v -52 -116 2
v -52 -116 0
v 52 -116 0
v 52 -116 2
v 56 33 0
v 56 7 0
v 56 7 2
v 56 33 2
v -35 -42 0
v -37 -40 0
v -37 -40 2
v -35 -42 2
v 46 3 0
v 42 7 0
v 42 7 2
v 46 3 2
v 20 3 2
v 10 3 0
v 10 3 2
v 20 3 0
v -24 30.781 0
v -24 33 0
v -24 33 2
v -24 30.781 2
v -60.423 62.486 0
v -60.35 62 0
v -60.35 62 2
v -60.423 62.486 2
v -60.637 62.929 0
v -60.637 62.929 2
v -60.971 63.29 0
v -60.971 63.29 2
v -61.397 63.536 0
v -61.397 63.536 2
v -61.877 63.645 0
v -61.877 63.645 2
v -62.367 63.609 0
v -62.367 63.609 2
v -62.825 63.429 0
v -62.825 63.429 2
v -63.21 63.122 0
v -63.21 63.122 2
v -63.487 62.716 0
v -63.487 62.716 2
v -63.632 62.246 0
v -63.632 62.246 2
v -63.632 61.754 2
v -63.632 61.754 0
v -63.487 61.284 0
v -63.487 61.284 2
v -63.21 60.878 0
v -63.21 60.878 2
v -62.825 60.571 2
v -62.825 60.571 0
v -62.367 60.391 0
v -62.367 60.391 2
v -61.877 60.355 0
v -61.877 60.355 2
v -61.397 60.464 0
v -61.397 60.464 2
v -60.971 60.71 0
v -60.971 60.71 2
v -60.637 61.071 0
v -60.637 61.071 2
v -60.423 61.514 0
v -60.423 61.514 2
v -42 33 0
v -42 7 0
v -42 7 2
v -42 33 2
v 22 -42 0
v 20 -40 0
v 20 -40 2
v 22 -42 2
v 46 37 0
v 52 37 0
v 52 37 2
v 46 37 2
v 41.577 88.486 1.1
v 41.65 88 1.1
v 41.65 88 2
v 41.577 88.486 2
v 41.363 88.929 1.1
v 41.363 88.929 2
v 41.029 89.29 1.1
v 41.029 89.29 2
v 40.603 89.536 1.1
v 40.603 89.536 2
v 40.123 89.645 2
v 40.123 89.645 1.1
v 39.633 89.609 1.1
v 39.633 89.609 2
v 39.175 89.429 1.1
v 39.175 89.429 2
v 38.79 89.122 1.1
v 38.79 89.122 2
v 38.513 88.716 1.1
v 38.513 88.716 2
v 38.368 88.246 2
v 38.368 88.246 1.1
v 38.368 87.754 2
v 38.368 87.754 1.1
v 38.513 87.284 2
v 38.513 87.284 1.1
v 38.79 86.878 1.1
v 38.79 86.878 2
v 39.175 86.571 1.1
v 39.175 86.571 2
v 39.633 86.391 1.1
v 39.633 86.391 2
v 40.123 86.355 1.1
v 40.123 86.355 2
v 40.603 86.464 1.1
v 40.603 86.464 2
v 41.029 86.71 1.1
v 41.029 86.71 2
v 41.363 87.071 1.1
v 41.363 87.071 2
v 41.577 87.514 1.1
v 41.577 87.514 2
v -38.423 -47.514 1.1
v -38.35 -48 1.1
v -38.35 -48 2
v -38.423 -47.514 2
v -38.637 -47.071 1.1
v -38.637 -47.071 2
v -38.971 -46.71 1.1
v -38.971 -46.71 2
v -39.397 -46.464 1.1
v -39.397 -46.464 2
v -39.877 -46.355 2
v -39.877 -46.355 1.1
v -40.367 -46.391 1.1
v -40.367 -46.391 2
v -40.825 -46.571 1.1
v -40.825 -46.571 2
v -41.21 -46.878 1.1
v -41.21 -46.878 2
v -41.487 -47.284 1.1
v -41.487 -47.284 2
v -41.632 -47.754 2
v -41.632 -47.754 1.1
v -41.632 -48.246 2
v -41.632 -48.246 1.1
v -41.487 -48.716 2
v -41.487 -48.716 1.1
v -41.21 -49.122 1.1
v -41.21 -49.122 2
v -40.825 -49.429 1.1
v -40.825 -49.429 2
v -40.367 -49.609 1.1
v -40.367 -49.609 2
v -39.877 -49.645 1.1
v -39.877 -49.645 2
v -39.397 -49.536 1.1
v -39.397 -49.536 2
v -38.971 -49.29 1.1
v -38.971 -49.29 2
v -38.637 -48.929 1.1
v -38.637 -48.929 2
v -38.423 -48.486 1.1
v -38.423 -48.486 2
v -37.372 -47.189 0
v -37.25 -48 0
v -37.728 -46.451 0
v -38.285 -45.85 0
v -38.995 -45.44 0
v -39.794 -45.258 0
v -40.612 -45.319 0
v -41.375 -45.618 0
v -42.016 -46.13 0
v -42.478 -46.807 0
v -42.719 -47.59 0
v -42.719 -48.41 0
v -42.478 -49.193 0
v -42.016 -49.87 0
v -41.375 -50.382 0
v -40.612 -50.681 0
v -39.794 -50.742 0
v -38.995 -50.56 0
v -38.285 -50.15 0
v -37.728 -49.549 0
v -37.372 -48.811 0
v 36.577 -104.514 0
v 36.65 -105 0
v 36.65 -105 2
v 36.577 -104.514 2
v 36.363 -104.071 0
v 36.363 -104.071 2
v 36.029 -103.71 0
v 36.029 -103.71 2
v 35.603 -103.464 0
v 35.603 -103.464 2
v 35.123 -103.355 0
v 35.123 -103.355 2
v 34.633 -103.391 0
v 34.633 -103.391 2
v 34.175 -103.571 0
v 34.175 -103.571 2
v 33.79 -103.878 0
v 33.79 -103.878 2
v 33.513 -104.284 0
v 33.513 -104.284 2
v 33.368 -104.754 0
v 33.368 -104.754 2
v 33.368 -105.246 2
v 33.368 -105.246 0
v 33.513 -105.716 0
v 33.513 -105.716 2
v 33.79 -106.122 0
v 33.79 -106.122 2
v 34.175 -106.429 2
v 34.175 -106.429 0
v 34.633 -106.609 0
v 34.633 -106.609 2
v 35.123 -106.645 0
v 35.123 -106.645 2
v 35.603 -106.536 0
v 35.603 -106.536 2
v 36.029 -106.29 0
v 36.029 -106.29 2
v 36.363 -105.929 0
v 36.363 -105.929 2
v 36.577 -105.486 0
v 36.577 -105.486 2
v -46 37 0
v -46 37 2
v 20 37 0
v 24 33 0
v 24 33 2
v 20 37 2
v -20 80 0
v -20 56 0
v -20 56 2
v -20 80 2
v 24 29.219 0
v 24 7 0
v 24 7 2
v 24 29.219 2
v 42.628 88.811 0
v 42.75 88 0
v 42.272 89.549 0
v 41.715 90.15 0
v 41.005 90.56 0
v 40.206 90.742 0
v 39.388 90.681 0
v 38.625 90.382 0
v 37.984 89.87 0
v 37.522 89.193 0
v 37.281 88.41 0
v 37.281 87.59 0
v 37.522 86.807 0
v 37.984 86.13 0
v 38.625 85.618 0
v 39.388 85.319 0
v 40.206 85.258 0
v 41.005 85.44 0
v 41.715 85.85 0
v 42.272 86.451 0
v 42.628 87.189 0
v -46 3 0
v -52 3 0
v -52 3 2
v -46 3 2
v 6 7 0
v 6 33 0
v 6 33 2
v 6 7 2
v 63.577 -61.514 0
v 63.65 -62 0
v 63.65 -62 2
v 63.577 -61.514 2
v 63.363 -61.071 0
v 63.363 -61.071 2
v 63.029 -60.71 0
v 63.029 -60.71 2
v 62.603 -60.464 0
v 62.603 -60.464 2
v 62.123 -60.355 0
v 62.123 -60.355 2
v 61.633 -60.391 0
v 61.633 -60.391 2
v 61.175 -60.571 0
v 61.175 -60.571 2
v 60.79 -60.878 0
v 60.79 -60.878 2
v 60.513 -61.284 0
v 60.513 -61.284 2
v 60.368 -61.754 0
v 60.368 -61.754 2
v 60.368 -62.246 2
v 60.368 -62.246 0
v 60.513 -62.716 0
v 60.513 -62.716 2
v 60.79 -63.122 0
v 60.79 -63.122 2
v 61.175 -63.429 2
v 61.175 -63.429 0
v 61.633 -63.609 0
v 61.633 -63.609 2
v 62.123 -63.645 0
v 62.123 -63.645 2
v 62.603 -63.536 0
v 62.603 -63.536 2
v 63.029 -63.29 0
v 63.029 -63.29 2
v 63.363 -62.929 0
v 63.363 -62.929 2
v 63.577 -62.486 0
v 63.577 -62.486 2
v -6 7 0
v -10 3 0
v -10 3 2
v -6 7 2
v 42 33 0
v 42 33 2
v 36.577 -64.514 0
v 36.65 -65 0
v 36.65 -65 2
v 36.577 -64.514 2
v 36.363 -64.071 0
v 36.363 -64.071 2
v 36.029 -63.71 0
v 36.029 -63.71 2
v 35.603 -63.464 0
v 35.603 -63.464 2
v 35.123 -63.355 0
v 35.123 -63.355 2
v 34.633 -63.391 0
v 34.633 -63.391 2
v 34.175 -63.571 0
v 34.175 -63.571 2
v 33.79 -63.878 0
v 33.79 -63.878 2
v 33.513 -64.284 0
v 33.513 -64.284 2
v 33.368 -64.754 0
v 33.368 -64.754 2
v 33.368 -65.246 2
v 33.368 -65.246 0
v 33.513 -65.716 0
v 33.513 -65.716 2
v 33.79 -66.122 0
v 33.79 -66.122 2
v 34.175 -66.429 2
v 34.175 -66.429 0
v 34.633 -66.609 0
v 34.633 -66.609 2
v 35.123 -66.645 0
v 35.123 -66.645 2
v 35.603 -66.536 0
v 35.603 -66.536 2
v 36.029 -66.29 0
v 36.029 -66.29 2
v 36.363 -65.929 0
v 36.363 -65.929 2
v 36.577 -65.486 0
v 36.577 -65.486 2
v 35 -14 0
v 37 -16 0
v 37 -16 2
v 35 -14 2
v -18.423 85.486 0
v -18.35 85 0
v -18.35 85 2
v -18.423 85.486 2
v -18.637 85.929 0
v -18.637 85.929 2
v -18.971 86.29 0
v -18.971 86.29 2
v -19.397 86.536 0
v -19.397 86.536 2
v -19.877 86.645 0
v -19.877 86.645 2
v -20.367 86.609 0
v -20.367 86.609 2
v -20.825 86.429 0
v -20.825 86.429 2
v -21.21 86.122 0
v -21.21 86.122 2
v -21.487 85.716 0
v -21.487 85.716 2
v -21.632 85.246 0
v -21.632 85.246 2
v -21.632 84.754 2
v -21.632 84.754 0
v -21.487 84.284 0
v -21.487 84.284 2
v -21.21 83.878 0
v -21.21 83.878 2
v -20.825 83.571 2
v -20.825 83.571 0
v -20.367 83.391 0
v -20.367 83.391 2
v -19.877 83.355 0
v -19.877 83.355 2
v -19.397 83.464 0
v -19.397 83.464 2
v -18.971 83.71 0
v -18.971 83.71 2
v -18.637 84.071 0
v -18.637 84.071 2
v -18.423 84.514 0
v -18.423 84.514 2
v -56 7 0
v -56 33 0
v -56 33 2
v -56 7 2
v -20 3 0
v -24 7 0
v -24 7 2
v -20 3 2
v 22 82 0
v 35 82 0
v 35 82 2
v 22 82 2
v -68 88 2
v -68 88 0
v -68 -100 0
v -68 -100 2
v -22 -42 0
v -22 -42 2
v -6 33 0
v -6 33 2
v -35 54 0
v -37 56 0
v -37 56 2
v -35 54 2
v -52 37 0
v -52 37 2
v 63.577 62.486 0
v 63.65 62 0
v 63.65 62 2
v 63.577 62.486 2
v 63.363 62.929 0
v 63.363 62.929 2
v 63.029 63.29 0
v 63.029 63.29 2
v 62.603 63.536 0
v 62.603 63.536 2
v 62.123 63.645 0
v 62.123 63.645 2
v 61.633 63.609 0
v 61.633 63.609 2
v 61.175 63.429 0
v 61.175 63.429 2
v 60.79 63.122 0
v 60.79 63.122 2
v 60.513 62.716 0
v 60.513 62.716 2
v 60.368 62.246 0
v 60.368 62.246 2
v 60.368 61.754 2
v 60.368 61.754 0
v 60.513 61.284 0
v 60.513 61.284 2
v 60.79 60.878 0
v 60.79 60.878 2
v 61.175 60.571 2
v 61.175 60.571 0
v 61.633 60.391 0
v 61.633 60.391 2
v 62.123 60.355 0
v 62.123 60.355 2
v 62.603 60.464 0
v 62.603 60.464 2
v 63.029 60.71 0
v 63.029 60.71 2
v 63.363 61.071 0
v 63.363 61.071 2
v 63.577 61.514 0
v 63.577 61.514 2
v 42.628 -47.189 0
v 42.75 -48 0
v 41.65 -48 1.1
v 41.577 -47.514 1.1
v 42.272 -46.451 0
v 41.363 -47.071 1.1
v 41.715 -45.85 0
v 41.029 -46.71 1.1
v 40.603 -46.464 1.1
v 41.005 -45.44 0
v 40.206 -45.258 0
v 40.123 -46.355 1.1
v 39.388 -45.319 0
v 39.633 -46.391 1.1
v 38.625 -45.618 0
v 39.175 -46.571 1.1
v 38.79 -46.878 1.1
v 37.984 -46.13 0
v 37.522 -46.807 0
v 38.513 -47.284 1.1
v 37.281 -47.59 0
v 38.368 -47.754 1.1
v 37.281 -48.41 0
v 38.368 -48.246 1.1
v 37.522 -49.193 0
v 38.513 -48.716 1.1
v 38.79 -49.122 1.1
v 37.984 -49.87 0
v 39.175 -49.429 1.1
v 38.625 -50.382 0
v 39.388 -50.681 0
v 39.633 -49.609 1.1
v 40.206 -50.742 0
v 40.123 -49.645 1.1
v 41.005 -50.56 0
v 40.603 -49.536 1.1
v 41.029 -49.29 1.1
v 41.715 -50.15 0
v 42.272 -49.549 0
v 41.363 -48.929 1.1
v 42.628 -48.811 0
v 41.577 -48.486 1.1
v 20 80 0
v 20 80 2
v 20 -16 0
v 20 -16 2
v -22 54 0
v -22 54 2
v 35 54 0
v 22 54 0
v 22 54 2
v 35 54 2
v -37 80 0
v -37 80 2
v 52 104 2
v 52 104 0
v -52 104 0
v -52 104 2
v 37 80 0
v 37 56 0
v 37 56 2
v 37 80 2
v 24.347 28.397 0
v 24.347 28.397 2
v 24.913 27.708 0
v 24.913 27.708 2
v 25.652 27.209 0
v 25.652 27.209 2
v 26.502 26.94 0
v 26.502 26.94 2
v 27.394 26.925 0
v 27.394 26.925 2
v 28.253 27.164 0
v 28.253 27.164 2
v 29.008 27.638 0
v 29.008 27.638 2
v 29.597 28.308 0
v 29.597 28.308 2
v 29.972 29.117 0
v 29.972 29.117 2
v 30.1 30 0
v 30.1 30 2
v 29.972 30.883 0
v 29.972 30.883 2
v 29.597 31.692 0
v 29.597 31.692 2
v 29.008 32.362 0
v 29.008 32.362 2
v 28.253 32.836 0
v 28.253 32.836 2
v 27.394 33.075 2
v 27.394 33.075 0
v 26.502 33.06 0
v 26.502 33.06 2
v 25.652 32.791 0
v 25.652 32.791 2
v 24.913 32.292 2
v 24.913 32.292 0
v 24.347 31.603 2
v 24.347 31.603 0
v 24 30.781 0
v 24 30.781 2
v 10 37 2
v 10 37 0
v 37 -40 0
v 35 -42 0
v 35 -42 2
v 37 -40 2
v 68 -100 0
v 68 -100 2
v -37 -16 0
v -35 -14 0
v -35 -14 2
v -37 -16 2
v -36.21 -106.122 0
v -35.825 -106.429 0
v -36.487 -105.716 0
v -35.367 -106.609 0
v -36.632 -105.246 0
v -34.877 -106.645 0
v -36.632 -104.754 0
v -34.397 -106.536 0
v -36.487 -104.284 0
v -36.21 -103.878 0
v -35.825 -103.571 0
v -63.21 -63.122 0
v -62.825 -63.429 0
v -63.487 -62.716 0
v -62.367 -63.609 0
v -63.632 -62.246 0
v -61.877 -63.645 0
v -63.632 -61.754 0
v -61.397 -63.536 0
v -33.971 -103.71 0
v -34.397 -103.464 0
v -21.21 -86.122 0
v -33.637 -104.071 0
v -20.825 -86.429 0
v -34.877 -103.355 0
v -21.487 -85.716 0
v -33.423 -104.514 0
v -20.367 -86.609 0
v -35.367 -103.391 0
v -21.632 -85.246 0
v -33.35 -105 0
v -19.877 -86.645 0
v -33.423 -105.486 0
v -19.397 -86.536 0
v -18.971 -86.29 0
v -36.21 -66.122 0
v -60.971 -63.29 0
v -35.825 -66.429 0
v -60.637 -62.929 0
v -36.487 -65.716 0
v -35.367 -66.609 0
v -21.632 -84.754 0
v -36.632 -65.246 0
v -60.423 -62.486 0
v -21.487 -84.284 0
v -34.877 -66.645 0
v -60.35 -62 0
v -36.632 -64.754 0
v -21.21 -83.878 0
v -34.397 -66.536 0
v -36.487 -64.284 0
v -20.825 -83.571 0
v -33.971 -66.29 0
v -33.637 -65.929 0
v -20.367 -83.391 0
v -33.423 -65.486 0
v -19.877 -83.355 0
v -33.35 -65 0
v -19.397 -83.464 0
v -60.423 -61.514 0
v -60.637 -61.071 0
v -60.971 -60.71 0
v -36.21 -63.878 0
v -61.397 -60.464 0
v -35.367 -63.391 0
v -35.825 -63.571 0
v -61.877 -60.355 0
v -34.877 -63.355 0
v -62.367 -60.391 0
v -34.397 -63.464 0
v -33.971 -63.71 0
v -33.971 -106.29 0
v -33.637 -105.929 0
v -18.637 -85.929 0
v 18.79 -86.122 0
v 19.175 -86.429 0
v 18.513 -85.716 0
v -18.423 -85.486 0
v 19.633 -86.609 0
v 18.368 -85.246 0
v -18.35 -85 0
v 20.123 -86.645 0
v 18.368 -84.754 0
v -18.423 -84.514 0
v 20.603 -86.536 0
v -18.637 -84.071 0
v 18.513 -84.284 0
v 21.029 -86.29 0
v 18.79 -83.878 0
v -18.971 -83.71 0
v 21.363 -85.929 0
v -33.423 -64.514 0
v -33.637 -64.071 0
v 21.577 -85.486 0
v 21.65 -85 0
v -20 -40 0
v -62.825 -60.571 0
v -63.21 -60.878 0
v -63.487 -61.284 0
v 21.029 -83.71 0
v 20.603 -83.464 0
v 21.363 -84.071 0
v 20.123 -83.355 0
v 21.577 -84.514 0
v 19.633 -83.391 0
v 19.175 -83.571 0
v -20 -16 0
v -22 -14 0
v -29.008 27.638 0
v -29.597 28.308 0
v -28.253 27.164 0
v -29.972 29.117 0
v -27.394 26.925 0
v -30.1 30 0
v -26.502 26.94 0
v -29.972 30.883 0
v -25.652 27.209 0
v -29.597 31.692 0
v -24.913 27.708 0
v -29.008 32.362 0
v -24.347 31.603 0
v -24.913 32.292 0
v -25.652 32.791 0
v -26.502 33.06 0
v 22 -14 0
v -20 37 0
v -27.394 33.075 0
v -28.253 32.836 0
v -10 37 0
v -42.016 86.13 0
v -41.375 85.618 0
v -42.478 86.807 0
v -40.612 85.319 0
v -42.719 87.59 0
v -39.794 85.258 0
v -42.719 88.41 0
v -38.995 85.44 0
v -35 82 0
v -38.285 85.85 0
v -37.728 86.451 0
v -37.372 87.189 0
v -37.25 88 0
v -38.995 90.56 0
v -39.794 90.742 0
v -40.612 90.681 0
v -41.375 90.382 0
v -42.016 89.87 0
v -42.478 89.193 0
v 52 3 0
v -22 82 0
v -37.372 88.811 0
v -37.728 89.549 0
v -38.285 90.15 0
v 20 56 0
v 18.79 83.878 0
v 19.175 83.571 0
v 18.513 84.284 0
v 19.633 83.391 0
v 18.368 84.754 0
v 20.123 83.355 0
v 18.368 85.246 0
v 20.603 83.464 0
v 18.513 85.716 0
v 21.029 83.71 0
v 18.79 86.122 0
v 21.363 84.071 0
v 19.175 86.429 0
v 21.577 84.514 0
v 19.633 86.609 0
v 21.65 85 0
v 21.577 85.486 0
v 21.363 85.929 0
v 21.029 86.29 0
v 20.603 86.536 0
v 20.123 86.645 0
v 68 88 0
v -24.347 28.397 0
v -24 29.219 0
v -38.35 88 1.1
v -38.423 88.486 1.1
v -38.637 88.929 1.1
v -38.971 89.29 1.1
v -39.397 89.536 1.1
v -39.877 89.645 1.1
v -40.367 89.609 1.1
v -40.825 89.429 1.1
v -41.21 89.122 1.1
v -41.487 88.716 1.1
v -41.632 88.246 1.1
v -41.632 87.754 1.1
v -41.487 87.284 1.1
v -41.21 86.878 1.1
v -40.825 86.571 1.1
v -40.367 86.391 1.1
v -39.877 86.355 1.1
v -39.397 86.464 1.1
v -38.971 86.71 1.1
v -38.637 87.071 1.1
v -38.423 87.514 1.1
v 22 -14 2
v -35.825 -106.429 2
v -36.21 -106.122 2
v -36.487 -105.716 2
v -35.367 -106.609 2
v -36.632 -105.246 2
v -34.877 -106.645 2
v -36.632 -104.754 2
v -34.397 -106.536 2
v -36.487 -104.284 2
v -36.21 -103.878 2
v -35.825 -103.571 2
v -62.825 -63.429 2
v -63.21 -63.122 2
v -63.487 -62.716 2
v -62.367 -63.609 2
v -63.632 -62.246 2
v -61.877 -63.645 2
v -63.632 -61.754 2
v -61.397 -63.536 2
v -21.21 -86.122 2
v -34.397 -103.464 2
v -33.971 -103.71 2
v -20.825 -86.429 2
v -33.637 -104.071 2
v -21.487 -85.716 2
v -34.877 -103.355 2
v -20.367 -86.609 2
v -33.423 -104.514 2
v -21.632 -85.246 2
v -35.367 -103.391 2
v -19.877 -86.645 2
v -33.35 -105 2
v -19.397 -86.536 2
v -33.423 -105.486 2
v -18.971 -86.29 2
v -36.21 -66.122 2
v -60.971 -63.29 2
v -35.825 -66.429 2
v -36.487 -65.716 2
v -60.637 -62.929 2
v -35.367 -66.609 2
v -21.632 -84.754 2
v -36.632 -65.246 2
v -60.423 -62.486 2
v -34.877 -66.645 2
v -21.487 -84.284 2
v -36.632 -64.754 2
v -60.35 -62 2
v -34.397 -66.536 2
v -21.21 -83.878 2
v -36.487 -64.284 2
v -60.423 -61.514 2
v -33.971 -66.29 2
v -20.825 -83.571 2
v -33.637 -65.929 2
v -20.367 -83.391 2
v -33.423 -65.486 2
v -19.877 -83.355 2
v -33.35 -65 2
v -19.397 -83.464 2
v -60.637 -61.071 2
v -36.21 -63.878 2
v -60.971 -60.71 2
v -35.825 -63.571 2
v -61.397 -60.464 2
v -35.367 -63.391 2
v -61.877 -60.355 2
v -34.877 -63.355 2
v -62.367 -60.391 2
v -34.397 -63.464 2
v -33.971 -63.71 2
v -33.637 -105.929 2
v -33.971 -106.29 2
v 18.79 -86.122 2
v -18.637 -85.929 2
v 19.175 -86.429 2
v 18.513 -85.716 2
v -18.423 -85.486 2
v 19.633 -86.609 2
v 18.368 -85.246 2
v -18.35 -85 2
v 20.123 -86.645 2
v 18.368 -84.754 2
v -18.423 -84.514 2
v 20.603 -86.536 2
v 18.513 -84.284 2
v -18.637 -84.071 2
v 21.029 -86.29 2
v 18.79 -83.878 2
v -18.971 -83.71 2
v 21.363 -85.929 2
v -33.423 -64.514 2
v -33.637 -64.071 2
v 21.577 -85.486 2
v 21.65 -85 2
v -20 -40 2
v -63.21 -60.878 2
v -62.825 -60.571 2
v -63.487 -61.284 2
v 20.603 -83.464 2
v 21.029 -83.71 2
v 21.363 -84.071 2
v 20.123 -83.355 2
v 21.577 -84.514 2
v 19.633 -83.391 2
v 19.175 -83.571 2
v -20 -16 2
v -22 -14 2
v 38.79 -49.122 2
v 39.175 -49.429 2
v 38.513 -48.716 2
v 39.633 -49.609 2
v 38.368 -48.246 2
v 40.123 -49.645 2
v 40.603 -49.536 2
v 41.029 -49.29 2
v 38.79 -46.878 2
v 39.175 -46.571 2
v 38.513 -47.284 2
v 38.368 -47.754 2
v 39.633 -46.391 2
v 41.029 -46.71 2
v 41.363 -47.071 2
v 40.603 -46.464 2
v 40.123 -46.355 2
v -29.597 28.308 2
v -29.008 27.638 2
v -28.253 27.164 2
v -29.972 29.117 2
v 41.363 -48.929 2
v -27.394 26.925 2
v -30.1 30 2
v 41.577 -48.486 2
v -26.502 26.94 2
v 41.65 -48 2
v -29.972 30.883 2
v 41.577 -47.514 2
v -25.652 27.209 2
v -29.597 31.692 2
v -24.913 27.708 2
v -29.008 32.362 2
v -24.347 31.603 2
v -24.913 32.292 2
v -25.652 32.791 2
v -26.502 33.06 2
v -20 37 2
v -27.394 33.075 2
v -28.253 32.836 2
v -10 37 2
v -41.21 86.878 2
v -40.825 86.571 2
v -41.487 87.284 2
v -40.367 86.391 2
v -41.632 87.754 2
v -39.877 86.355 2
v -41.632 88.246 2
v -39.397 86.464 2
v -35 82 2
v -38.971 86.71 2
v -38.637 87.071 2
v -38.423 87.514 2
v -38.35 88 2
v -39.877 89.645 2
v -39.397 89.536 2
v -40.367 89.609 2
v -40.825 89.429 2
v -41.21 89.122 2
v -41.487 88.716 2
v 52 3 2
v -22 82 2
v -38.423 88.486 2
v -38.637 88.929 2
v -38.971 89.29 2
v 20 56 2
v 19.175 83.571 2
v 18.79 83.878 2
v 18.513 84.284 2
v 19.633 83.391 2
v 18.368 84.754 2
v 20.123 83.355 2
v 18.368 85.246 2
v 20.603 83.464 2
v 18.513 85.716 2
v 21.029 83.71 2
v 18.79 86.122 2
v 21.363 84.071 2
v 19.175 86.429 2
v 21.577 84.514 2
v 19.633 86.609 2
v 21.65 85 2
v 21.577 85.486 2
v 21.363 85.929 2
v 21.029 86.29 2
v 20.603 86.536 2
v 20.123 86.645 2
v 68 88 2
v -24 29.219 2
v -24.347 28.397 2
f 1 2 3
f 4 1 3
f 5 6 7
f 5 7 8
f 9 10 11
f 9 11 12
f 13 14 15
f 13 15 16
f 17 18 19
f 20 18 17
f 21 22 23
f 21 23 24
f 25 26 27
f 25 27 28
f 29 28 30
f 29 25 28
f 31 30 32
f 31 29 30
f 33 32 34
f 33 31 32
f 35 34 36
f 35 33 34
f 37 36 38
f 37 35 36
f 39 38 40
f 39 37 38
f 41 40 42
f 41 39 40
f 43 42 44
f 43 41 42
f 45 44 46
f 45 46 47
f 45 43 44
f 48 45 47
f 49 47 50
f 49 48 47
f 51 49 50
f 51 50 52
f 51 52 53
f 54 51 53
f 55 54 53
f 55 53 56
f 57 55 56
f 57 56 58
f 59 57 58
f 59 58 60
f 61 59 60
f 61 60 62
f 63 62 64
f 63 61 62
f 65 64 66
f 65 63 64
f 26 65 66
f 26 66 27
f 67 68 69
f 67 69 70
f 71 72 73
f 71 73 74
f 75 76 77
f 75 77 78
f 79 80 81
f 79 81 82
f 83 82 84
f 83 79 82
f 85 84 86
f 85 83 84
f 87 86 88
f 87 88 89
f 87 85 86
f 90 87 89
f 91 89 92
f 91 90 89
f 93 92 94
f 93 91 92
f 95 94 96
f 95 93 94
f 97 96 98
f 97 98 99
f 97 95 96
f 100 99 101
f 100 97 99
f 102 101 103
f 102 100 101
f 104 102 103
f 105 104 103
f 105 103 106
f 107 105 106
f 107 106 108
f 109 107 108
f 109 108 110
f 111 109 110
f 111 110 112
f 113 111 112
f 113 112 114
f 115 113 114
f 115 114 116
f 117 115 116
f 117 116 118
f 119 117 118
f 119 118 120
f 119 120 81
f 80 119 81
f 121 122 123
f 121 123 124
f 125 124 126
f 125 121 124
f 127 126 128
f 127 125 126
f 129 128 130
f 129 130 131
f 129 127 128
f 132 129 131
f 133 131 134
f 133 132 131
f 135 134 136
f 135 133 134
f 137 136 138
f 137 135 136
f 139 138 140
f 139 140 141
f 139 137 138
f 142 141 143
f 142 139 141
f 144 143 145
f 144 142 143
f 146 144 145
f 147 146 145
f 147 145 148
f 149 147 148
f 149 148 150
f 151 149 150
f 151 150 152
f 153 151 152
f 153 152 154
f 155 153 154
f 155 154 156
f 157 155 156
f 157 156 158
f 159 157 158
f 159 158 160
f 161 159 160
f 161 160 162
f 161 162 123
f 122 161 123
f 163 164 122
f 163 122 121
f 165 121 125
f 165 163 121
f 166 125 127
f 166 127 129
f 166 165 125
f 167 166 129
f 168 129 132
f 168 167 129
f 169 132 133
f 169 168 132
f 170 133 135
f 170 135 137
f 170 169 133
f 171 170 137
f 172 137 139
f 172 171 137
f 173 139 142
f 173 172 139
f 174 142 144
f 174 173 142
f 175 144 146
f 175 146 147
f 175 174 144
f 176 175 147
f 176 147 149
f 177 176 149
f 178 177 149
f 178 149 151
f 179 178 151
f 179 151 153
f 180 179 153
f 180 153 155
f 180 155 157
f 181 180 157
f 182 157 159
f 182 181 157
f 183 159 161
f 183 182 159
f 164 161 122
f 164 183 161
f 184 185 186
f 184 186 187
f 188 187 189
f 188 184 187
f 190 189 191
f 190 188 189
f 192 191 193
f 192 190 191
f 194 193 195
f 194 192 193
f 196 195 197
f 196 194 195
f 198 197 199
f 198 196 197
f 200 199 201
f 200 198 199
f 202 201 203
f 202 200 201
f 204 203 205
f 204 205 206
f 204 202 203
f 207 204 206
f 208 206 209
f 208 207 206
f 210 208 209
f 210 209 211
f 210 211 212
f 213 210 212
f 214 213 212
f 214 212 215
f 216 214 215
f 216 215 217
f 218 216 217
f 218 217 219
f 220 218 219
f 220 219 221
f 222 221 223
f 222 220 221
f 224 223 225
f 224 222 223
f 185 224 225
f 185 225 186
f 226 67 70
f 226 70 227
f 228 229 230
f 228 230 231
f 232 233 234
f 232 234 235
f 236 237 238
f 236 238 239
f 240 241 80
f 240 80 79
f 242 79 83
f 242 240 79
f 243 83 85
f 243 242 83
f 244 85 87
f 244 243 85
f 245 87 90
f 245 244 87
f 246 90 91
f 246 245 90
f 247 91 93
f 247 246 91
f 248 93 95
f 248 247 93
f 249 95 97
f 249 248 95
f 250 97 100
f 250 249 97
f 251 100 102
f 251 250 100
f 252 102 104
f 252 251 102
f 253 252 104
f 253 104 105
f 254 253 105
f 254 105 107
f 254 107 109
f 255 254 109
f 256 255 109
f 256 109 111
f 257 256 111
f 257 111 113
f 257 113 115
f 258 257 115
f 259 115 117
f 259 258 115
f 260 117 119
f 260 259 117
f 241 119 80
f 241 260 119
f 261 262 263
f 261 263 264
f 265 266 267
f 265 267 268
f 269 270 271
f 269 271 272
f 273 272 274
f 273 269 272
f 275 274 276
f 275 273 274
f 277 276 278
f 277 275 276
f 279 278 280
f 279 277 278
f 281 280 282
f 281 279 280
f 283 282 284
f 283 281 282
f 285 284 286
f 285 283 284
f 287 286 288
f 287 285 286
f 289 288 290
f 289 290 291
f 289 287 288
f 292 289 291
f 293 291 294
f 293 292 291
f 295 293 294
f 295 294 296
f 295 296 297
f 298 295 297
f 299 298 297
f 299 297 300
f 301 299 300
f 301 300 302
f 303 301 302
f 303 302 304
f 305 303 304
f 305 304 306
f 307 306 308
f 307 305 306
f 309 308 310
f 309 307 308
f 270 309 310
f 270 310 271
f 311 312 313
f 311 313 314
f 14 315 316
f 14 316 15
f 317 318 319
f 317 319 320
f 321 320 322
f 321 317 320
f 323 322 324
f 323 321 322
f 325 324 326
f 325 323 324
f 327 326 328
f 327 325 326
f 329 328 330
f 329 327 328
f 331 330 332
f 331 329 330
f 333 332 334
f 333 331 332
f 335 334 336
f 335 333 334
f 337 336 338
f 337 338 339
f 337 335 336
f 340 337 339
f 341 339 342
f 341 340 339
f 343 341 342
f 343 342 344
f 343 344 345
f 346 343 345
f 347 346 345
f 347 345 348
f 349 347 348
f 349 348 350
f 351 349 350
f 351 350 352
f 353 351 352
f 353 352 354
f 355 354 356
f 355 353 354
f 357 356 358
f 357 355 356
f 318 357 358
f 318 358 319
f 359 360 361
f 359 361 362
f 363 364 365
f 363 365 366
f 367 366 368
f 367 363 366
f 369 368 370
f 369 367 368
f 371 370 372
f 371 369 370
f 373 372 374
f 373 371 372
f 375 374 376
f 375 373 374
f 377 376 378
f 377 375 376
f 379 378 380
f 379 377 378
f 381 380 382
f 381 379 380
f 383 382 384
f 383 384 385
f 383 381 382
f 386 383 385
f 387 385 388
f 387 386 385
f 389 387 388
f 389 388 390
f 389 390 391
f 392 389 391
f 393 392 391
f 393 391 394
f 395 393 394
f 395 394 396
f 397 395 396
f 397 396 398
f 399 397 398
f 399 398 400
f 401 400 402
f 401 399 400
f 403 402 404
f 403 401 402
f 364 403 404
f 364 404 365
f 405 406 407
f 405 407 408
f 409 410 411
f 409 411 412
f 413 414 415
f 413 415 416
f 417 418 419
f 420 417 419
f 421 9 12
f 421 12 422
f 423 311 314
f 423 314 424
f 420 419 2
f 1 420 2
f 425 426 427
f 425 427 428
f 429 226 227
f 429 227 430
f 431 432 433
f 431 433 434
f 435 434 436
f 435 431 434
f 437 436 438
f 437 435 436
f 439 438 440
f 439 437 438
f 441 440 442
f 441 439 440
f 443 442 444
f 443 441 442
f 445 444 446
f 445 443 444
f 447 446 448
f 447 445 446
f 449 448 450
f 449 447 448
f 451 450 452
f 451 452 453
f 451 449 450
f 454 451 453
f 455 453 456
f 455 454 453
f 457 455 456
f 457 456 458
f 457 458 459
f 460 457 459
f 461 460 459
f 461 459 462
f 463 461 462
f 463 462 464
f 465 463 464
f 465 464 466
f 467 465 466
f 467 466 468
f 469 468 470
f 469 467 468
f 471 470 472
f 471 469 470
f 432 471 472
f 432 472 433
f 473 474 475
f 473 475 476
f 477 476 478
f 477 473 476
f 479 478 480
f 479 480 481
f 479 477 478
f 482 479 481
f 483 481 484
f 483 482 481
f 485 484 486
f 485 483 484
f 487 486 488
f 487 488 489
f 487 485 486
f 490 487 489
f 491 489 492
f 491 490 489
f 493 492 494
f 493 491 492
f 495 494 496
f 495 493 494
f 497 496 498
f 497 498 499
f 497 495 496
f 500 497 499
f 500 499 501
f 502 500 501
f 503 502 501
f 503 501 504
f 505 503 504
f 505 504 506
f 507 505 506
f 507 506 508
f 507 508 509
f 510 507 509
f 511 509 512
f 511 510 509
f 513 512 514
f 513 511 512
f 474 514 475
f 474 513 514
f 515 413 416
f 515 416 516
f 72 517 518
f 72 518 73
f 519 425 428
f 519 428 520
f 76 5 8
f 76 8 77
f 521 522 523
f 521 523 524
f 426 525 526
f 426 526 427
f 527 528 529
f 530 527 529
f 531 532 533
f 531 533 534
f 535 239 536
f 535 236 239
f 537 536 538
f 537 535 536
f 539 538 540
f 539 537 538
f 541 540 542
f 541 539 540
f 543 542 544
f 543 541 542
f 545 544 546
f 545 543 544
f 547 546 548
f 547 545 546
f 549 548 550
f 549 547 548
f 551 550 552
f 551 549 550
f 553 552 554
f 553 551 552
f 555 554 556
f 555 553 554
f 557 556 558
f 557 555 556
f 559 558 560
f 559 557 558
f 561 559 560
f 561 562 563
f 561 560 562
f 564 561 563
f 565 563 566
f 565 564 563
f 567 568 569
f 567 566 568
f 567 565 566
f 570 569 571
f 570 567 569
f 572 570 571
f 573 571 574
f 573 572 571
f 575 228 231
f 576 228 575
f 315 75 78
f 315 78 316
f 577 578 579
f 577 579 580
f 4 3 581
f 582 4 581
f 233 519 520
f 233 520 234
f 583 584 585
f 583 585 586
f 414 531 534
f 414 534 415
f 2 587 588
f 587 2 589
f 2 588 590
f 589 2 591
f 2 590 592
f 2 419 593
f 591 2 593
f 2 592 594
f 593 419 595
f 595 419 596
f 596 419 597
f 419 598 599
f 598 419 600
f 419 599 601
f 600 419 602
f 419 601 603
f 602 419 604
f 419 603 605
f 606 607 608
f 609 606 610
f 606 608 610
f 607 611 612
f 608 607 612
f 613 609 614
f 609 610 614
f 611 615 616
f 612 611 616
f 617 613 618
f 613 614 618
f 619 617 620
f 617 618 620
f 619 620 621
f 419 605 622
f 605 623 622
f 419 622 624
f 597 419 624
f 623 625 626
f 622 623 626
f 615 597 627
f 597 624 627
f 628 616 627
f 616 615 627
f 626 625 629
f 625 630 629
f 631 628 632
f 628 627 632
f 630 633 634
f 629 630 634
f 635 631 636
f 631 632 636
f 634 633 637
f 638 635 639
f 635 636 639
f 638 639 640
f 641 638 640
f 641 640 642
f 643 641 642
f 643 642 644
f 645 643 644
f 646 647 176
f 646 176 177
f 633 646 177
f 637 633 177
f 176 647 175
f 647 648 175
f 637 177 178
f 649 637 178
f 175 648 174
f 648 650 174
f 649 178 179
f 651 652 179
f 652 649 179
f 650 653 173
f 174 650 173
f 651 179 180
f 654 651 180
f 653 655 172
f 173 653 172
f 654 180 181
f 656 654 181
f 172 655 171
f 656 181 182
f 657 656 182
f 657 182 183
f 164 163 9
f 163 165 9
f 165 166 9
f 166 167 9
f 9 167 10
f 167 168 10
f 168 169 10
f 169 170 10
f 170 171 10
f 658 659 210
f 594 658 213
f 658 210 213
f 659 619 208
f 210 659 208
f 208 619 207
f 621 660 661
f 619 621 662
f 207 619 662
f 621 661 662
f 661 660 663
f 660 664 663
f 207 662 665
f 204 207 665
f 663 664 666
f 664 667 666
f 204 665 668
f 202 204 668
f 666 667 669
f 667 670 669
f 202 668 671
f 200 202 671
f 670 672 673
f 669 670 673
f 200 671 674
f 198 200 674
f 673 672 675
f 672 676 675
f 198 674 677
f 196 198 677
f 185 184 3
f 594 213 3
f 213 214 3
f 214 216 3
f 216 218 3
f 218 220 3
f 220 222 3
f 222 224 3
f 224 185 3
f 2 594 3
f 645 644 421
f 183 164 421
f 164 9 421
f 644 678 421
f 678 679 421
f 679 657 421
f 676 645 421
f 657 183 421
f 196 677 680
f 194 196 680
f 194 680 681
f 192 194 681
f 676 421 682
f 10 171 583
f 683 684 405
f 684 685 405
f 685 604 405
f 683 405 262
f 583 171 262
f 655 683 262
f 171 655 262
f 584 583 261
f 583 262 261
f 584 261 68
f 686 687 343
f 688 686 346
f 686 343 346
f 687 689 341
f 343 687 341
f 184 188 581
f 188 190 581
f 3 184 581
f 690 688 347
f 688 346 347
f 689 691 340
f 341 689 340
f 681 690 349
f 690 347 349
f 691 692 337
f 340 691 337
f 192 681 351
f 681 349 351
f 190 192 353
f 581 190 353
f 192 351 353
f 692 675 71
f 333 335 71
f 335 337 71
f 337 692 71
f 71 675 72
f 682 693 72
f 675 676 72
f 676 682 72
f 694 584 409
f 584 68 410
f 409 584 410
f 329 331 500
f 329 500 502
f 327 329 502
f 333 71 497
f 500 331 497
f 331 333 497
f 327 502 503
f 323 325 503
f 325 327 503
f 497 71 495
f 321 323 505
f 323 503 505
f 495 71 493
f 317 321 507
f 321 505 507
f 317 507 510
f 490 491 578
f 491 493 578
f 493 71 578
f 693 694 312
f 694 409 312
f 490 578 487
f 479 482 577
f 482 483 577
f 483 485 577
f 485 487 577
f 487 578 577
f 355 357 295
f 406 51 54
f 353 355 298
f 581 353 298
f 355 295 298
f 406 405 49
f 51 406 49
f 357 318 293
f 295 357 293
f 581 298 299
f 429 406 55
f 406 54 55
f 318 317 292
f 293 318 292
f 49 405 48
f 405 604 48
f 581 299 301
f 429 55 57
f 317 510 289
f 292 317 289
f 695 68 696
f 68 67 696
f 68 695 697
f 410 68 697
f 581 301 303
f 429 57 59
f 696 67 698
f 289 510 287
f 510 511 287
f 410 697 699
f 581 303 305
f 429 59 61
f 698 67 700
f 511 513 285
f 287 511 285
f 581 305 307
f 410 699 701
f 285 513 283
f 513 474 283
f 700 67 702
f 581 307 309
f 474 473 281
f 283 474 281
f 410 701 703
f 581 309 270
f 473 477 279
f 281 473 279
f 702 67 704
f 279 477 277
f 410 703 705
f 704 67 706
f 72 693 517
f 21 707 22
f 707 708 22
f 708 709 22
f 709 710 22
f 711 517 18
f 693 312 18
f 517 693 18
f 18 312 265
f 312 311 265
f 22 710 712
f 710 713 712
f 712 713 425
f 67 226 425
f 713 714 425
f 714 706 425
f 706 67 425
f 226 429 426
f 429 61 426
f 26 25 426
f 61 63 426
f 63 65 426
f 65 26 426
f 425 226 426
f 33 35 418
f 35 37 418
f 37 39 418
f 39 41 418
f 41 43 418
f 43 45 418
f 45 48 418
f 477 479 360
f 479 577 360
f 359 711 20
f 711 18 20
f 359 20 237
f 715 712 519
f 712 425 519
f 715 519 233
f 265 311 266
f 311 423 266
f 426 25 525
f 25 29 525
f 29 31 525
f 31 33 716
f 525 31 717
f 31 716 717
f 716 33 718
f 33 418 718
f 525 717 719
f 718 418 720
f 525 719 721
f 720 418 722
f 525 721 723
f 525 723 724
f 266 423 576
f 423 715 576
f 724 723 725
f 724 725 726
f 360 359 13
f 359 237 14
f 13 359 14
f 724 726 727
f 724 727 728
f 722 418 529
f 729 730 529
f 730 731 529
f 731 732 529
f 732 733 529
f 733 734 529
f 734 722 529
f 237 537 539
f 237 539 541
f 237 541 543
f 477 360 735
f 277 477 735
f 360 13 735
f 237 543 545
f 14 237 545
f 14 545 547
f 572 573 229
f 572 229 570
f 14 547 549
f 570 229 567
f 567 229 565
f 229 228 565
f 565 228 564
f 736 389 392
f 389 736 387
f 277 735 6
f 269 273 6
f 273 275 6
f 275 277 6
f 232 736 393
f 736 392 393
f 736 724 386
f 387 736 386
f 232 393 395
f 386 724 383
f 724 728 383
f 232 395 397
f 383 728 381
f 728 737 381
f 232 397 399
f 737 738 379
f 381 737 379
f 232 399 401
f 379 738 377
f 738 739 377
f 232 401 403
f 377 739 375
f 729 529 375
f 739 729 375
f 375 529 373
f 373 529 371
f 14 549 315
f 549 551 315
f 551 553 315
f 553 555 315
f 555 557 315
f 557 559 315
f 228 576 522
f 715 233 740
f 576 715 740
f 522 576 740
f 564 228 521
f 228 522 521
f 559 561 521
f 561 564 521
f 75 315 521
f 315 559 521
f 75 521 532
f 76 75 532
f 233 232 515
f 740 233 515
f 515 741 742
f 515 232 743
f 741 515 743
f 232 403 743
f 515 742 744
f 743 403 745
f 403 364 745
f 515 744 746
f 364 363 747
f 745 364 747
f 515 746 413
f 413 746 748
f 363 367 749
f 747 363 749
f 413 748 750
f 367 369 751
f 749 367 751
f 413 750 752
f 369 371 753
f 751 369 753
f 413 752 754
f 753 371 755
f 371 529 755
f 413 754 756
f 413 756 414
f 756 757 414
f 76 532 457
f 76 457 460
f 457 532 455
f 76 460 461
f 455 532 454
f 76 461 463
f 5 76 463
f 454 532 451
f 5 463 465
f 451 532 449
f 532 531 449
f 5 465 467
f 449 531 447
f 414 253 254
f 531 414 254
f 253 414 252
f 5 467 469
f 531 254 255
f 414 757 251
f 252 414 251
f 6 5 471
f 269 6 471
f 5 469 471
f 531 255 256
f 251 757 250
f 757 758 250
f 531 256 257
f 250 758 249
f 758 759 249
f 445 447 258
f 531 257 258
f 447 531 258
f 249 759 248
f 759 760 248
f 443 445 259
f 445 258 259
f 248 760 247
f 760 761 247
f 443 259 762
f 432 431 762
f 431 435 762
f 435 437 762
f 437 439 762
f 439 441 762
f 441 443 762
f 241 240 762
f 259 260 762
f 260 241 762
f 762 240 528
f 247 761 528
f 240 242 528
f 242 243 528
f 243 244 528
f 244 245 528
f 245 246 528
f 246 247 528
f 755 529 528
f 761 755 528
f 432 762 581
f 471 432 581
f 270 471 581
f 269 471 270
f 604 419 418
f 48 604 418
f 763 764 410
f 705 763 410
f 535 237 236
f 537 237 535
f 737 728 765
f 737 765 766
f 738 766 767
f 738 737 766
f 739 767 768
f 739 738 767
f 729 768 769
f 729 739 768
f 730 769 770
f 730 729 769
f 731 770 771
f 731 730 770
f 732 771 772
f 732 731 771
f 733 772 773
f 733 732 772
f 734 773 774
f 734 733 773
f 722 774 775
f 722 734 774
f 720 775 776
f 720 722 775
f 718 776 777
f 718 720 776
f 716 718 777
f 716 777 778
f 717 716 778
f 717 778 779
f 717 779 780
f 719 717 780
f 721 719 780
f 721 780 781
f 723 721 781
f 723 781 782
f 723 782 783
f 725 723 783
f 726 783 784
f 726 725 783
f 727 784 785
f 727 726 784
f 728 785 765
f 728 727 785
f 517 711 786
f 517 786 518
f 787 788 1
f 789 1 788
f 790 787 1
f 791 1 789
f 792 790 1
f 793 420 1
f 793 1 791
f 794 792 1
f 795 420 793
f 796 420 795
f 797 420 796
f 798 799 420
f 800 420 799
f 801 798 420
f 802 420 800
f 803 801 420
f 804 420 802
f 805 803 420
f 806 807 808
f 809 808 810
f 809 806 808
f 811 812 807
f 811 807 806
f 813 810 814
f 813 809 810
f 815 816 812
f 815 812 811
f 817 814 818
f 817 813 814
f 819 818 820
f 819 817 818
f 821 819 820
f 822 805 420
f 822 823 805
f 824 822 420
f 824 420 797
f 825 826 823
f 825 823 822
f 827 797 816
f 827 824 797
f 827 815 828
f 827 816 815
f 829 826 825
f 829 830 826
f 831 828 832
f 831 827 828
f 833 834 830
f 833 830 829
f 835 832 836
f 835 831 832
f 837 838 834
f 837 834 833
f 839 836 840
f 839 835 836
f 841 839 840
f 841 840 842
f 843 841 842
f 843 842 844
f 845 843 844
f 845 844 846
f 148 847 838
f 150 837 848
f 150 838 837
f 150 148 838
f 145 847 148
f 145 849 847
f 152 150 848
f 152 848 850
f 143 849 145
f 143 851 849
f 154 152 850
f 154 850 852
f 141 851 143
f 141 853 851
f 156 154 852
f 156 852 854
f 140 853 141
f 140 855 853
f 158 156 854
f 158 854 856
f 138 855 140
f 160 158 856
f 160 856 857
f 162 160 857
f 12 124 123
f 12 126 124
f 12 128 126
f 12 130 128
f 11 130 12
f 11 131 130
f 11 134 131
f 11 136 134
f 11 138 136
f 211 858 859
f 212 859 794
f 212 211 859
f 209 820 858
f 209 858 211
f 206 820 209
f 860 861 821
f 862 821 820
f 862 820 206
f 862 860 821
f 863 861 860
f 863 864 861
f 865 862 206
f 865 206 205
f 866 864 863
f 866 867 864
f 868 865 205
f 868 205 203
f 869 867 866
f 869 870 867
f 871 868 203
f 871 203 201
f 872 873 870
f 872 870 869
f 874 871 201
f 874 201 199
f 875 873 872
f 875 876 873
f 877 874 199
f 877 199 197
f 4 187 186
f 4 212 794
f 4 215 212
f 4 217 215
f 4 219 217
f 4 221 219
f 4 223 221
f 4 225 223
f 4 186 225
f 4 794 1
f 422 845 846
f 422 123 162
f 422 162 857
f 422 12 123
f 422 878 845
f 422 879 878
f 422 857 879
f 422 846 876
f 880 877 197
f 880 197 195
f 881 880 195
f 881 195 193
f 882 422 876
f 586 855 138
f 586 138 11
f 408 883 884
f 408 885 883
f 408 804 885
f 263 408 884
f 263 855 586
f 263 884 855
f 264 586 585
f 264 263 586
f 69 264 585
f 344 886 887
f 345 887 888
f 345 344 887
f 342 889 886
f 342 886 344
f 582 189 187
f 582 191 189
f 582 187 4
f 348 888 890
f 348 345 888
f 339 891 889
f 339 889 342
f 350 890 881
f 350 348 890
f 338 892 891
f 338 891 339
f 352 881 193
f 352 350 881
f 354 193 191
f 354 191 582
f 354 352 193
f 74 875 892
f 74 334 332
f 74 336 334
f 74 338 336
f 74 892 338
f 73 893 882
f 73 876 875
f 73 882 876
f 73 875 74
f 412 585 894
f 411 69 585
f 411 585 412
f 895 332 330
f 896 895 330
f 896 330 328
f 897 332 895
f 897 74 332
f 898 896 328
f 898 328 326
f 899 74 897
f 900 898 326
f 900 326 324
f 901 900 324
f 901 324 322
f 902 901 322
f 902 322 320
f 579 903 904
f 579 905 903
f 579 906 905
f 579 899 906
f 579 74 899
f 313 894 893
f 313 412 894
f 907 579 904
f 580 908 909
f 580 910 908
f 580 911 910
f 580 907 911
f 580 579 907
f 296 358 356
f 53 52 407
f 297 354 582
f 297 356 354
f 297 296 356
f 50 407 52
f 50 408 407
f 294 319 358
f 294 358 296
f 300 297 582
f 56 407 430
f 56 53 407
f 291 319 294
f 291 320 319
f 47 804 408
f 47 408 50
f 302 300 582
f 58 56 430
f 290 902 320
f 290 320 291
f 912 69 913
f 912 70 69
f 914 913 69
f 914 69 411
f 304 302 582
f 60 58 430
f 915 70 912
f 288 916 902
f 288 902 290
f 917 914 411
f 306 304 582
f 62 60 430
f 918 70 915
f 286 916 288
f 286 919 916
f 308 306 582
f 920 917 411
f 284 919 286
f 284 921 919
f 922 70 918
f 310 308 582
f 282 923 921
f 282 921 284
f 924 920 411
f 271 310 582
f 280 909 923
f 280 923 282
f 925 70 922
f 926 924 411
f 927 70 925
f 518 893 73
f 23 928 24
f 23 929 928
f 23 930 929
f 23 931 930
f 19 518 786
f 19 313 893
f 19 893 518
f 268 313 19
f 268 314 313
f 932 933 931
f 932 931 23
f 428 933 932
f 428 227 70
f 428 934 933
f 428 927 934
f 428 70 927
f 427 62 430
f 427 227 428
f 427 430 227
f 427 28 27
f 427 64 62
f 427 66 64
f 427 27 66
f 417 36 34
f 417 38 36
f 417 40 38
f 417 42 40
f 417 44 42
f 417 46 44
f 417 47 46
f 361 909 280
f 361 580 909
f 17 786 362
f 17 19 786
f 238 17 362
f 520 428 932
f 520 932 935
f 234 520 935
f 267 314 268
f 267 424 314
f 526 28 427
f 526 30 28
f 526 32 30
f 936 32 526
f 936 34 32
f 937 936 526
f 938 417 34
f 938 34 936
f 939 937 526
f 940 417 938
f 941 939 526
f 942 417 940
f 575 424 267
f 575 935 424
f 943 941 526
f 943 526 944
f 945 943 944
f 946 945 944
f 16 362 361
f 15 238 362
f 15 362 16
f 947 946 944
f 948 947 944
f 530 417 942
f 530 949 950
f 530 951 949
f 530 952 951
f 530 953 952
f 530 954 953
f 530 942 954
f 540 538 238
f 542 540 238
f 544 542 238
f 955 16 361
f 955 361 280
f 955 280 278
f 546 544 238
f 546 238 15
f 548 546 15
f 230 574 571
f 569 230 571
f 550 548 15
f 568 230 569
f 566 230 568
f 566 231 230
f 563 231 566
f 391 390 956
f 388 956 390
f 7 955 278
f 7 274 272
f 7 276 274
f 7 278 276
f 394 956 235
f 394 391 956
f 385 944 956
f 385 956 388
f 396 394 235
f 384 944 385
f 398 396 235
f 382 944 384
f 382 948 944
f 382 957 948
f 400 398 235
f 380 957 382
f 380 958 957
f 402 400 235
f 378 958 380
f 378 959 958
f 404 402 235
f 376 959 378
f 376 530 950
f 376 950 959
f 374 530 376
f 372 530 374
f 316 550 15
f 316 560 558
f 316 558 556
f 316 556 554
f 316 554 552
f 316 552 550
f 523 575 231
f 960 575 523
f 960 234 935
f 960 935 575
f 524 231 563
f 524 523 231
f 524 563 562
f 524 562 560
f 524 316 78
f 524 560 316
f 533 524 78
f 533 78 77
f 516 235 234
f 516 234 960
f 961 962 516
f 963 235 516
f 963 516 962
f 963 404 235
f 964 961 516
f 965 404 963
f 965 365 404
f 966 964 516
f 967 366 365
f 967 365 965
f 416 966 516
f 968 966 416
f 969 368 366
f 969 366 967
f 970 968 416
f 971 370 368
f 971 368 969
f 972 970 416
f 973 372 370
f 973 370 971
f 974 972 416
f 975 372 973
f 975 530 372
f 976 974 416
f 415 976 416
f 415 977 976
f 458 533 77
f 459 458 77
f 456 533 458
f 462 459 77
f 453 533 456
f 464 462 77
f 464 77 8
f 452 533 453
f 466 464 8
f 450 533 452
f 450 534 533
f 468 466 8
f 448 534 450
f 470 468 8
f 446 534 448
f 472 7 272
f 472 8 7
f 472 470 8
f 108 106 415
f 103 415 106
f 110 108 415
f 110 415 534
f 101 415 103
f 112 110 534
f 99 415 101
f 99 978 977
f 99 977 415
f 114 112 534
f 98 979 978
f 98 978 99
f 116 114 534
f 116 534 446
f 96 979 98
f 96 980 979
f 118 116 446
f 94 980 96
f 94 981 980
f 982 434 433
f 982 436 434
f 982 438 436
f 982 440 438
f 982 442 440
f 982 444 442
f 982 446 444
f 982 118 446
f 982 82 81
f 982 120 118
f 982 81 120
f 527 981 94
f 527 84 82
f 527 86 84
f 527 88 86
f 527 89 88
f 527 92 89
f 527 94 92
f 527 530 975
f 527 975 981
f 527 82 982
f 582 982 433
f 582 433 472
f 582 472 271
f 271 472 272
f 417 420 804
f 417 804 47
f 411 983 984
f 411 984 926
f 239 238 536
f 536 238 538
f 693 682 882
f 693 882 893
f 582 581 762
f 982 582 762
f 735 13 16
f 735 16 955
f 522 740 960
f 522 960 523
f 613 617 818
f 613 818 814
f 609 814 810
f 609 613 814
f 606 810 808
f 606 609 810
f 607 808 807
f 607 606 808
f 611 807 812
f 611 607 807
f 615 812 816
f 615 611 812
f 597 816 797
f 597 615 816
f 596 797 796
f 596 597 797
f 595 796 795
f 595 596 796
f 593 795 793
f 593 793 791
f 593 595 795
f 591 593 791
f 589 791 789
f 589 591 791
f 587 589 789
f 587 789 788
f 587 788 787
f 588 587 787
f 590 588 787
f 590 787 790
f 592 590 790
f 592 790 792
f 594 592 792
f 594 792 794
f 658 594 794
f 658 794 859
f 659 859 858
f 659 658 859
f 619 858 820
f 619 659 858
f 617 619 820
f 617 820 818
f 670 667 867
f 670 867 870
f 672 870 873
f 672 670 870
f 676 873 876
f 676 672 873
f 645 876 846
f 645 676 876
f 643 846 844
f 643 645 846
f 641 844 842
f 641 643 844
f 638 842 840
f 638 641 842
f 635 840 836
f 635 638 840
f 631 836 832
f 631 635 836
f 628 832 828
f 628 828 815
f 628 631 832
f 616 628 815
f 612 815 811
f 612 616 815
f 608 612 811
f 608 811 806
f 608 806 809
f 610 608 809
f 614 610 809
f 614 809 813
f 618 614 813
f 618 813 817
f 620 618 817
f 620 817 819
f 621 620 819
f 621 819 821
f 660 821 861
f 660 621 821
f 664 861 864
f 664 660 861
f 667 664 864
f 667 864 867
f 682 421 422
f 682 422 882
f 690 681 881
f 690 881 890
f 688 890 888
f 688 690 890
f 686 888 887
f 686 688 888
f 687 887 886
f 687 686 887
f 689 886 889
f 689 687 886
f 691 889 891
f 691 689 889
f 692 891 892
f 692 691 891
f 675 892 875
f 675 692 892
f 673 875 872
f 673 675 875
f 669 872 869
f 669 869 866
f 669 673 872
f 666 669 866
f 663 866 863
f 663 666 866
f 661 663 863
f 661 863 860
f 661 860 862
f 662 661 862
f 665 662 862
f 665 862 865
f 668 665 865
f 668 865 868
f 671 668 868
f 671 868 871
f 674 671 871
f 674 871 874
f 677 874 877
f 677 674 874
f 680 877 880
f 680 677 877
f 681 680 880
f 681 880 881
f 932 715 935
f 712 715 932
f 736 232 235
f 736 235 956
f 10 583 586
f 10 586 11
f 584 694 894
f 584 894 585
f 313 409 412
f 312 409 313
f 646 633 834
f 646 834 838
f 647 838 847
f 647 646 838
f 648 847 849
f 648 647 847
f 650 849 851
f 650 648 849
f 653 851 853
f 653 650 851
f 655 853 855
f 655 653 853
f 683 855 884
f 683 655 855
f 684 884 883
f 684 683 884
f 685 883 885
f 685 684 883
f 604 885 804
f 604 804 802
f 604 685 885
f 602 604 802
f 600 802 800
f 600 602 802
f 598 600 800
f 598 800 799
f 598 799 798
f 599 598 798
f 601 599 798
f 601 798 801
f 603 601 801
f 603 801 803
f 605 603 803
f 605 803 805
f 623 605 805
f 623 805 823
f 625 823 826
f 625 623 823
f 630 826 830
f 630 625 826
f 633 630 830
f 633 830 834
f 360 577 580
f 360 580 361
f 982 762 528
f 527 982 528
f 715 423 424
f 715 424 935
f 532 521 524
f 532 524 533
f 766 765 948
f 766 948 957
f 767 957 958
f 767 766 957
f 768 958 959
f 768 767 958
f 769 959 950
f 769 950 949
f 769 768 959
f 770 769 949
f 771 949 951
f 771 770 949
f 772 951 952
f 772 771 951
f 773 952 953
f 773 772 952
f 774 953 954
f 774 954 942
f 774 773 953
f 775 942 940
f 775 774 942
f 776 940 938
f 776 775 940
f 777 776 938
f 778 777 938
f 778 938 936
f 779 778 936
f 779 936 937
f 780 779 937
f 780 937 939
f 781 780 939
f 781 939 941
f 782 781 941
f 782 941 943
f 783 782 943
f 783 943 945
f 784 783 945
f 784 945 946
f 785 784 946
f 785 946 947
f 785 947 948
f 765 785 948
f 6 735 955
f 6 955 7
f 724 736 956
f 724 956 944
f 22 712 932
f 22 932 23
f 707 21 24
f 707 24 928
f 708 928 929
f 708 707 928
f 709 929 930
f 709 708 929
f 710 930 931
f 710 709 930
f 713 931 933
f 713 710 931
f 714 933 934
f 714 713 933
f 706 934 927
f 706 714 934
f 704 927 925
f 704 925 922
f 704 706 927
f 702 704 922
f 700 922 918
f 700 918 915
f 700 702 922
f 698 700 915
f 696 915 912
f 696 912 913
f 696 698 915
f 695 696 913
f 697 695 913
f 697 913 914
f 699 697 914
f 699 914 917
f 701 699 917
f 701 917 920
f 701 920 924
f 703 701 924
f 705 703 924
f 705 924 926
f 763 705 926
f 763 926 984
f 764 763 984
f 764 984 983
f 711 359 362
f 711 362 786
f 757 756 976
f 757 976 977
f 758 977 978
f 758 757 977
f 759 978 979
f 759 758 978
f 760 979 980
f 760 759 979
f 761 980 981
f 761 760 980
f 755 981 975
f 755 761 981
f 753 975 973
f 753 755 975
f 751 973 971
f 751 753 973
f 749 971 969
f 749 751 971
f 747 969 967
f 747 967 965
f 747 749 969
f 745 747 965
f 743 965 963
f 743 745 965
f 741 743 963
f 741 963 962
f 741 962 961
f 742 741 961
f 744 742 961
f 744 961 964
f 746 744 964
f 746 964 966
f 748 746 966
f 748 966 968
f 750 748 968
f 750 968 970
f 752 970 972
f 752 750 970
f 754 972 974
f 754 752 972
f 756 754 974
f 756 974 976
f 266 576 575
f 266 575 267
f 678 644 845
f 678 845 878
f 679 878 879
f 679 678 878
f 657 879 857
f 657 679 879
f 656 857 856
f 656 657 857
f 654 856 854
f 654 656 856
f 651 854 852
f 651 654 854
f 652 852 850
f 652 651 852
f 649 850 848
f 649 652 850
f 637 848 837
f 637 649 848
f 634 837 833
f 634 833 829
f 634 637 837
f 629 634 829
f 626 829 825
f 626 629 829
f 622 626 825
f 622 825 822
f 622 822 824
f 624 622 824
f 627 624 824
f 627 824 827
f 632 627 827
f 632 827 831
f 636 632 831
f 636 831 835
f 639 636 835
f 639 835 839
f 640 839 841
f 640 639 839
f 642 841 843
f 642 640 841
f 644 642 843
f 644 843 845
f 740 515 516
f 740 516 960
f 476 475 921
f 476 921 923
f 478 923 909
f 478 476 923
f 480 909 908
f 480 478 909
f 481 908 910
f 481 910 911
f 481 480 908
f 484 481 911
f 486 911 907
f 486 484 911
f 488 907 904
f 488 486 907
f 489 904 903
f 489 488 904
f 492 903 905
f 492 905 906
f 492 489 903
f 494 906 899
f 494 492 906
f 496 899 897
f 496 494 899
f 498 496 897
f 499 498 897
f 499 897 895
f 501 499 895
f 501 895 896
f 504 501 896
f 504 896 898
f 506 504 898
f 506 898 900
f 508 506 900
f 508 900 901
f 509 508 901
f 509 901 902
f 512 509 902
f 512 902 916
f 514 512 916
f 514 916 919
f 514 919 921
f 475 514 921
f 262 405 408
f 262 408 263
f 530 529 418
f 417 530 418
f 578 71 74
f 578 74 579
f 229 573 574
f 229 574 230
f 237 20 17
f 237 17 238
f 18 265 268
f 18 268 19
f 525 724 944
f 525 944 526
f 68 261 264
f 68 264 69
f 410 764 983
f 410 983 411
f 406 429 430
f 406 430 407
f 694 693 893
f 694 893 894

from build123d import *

# Parameters (mm, degrees)
SKETCH_6_R               = 1.65
EXTRUDE_401_DEPTH        = 2
SKETCH_7_R               = 3.1
CUT_EXTRUDE_474_DEPTH    = 2
SKETCH_8_R               = 2.75
D5P5_1P1_DEPTH           = 1.1
D5P5_1P1_DRAFT           = 45
D5P5_1P1_PROFILE_2_DEPTH = 1.1
D5P5_1P1_PROFILE_2_DRAFT = 45
D5P5_1P1_PROFILE_3_DEPTH = 1.1
D5P5_1P1_PROFILE_3_DRAFT = 45
D5P5_1P1_PROFILE_4_DEPTH = 1.1
D5P5_1P1_PROFILE_4_DRAFT = 45


with BuildPart() as part:
    # 草图6 → Extrude 401 (new body)
    with BuildSketch(Plane.XY):
        Polygon((-52, -116), (52, -116), (68, -100), (68, 88), (52, 104), (-52, 104), (-68, 88), (-68, -100), align=None)
        with Locations((-20, -85)):
            Circle(SKETCH_6_R, mode=Mode.SUBTRACT)
        with Locations((-62, -62)):
            Circle(SKETCH_6_R, mode=Mode.SUBTRACT)
        with Locations((-40, -48)):
            Circle(SKETCH_6_R, mode=Mode.SUBTRACT)
        with Locations((-35, -105)):
            Circle(SKETCH_6_R, mode=Mode.SUBTRACT)
        with Locations((-20, 85)):
            Circle(SKETCH_6_R, mode=Mode.SUBTRACT)
        with Locations((-62, 62)):
            Circle(SKETCH_6_R, mode=Mode.SUBTRACT)
        with Locations((-40, 88)):
            Circle(SKETCH_6_R, mode=Mode.SUBTRACT)
        with Locations((-35, -65)):
            Circle(SKETCH_6_R, mode=Mode.SUBTRACT)
        with Locations((20, -85)):
            Circle(SKETCH_6_R, mode=Mode.SUBTRACT)
        with Locations((62, -62)):
            Circle(SKETCH_6_R, mode=Mode.SUBTRACT)
        with Locations((40, -48)):
            Circle(SKETCH_6_R, mode=Mode.SUBTRACT)
        with Locations((35, -105)):
            Circle(SKETCH_6_R, mode=Mode.SUBTRACT)
        with Locations((20, 85)):
            Circle(SKETCH_6_R, mode=Mode.SUBTRACT)
        with Locations((62, 62)):
            Circle(SKETCH_6_R, mode=Mode.SUBTRACT)
        with Locations((40, 88)):
            Circle(SKETCH_6_R, mode=Mode.SUBTRACT)
        with Locations((35, -65)):
            Circle(SKETCH_6_R, mode=Mode.SUBTRACT)
        Polygon((-35, -42), (-22, -42), (-20, -40), (-20, -16), (-22, -14), (-35, -14), (-37, -16), (-37, -40), align=None, mode=Mode.SUBTRACT)
        Polygon((-35, 54), (-22, 54), (-20, 56), (-20, 80), (-22, 82), (-35, 82), (-37, 80), (-37, 56), align=None, mode=Mode.SUBTRACT)
        Polygon((22, -42), (35, -42), (37, -40), (37, -16), (35, -14), (22, -14), (20, -16), (20, -40), align=None, mode=Mode.SUBTRACT)
        Polygon((22, 54), (35, 54), (37, 56), (37, 80), (35, 82), (22, 82), (20, 80), (20, 56), align=None, mode=Mode.SUBTRACT)
        Polygon((-20, 3), (-10, 3), (-6, 7), (-6, 33), (-10, 37), (-20, 37), (-24, 33), (-24, 7), align=None, mode=Mode.SUBTRACT)
        Polygon((-52, 3), (-46, 3), (-42, 7), (-42, 33), (-46, 37), (-52, 37), (-56, 33), (-56, 7), align=None, mode=Mode.SUBTRACT)
        Polygon((10, 3), (20, 3), (24, 7), (24, 33), (20, 37), (10, 37), (6, 33), (6, 7), align=None, mode=Mode.SUBTRACT)
        Polygon((46, 3), (52, 3), (56, 7), (56, 33), (52, 37), (46, 37), (42, 33), (42, 7), align=None, mode=Mode.SUBTRACT)
    extrude(amount=EXTRUDE_401_DEPTH)

    # 草图7 → Cut-Extrude 474 (cut)
    with BuildSketch(Plane.XY):
        with Locations((-27, -30)):
            Circle(SKETCH_7_R)
        with Locations((-27, 30)):
            Circle(SKETCH_7_R)
        with Locations((27, -30)):
            Circle(SKETCH_7_R)
        with Locations((27, 30)):
            Circle(SKETCH_7_R)
    extrude(amount=CUT_EXTRUDE_474_DEPTH, mode=Mode.SUBTRACT)


with BuildPart() as d5p5_1p1_tool:
    # 草图8 → 侧鞍下沉头孔_D5p5深1p1 (with draft: the straight prism first)
    with BuildSketch(Plane.XY):
        with Locations((-40, -48)):
            Circle(SKETCH_8_R)
    extrude(amount=D5P5_1P1_DEPTH)
    # 侧鞍下沉头孔_D5p5深1p1: the draft: its side faces are tilted about the plane it starts from
    d5p5_1p1_sides = [d5p5_1p1_tool.faces().sort_by_distance(p)[0] for p in [
        (-42.75, -48, 0.55),
    ]]
    draft(d5p5_1p1_sides, Plane.XY, D5P5_1P1_DRAFT)


with BuildPart() as part_1:
    add(part.part)

    # 侧鞍下沉头孔_D5p5深1p1: cut by d5p5_1p1_tool
    add(d5p5_1p1_tool.part, mode=Mode.SUBTRACT)


with BuildPart() as d5p5_1p1_profile_2_tool:
    # 草图8 → 侧鞍下沉头孔_D5p5深1p1 profile 2 (with draft: the straight prism first)
    with BuildSketch(Plane.XY):
        with Locations((-40, 88)):
            Circle(SKETCH_8_R)
    extrude(amount=D5P5_1P1_PROFILE_2_DEPTH)
    # 侧鞍下沉头孔_D5p5深1p1 profile 2: the draft: its side faces are tilted about the plane it starts from
    d5p5_1p1_profile_2_sides = [d5p5_1p1_profile_2_tool.faces().sort_by_distance(p)[0] for p in [
        (-42.75, 88, 0.55),
    ]]
    draft(d5p5_1p1_profile_2_sides, Plane.XY, D5P5_1P1_PROFILE_2_DRAFT)


with BuildPart() as part_2:
    add(part_1.part)

    # 侧鞍下沉头孔_D5p5深1p1 profile 2: cut by d5p5_1p1_profile_2_tool
    add(d5p5_1p1_profile_2_tool.part, mode=Mode.SUBTRACT)


with BuildPart() as d5p5_1p1_profile_3_tool:
    # 草图8 → 侧鞍下沉头孔_D5p5深1p1 profile 3 (with draft: the straight prism first)
    with BuildSketch(Plane.XY):
        with Locations((40, -48)):
            Circle(SKETCH_8_R)
    extrude(amount=D5P5_1P1_PROFILE_3_DEPTH)
    # 侧鞍下沉头孔_D5p5深1p1 profile 3: the draft: its side faces are tilted about the plane it starts from
    d5p5_1p1_profile_3_sides = [d5p5_1p1_profile_3_tool.faces().sort_by_distance(p)[0] for p in [
        (37.25, -48, 0.55),
    ]]
    draft(d5p5_1p1_profile_3_sides, Plane.XY, D5P5_1P1_PROFILE_3_DRAFT)


with BuildPart() as part_3:
    add(part_2.part)

    # 侧鞍下沉头孔_D5p5深1p1 profile 3: cut by d5p5_1p1_profile_3_tool
    add(d5p5_1p1_profile_3_tool.part, mode=Mode.SUBTRACT)


with BuildPart() as d5p5_1p1_profile_4_tool:
    # 草图8 → 侧鞍下沉头孔_D5p5深1p1 profile 4 (with draft: the straight prism first)
    with BuildSketch(Plane.XY):
        with Locations((40, 88)):
            Circle(SKETCH_8_R)
    extrude(amount=D5P5_1P1_PROFILE_4_DEPTH)
    # 侧鞍下沉头孔_D5p5深1p1 profile 4: the draft: its side faces are tilted about the plane it starts from
    d5p5_1p1_profile_4_sides = [d5p5_1p1_profile_4_tool.faces().sort_by_distance(p)[0] for p in [
        (37.25, 88, 0.55),
    ]]
    draft(d5p5_1p1_profile_4_sides, Plane.XY, D5P5_1P1_PROFILE_4_DRAFT)


with BuildPart() as part_4:
    add(part_3.part)

    # 侧鞍下沉头孔_D5p5深1p1 profile 4: cut by d5p5_1p1_profile_4_tool
    add(d5p5_1p1_profile_4_tool.part, mode=Mode.SUBTRACT)


solid = part_4.part
